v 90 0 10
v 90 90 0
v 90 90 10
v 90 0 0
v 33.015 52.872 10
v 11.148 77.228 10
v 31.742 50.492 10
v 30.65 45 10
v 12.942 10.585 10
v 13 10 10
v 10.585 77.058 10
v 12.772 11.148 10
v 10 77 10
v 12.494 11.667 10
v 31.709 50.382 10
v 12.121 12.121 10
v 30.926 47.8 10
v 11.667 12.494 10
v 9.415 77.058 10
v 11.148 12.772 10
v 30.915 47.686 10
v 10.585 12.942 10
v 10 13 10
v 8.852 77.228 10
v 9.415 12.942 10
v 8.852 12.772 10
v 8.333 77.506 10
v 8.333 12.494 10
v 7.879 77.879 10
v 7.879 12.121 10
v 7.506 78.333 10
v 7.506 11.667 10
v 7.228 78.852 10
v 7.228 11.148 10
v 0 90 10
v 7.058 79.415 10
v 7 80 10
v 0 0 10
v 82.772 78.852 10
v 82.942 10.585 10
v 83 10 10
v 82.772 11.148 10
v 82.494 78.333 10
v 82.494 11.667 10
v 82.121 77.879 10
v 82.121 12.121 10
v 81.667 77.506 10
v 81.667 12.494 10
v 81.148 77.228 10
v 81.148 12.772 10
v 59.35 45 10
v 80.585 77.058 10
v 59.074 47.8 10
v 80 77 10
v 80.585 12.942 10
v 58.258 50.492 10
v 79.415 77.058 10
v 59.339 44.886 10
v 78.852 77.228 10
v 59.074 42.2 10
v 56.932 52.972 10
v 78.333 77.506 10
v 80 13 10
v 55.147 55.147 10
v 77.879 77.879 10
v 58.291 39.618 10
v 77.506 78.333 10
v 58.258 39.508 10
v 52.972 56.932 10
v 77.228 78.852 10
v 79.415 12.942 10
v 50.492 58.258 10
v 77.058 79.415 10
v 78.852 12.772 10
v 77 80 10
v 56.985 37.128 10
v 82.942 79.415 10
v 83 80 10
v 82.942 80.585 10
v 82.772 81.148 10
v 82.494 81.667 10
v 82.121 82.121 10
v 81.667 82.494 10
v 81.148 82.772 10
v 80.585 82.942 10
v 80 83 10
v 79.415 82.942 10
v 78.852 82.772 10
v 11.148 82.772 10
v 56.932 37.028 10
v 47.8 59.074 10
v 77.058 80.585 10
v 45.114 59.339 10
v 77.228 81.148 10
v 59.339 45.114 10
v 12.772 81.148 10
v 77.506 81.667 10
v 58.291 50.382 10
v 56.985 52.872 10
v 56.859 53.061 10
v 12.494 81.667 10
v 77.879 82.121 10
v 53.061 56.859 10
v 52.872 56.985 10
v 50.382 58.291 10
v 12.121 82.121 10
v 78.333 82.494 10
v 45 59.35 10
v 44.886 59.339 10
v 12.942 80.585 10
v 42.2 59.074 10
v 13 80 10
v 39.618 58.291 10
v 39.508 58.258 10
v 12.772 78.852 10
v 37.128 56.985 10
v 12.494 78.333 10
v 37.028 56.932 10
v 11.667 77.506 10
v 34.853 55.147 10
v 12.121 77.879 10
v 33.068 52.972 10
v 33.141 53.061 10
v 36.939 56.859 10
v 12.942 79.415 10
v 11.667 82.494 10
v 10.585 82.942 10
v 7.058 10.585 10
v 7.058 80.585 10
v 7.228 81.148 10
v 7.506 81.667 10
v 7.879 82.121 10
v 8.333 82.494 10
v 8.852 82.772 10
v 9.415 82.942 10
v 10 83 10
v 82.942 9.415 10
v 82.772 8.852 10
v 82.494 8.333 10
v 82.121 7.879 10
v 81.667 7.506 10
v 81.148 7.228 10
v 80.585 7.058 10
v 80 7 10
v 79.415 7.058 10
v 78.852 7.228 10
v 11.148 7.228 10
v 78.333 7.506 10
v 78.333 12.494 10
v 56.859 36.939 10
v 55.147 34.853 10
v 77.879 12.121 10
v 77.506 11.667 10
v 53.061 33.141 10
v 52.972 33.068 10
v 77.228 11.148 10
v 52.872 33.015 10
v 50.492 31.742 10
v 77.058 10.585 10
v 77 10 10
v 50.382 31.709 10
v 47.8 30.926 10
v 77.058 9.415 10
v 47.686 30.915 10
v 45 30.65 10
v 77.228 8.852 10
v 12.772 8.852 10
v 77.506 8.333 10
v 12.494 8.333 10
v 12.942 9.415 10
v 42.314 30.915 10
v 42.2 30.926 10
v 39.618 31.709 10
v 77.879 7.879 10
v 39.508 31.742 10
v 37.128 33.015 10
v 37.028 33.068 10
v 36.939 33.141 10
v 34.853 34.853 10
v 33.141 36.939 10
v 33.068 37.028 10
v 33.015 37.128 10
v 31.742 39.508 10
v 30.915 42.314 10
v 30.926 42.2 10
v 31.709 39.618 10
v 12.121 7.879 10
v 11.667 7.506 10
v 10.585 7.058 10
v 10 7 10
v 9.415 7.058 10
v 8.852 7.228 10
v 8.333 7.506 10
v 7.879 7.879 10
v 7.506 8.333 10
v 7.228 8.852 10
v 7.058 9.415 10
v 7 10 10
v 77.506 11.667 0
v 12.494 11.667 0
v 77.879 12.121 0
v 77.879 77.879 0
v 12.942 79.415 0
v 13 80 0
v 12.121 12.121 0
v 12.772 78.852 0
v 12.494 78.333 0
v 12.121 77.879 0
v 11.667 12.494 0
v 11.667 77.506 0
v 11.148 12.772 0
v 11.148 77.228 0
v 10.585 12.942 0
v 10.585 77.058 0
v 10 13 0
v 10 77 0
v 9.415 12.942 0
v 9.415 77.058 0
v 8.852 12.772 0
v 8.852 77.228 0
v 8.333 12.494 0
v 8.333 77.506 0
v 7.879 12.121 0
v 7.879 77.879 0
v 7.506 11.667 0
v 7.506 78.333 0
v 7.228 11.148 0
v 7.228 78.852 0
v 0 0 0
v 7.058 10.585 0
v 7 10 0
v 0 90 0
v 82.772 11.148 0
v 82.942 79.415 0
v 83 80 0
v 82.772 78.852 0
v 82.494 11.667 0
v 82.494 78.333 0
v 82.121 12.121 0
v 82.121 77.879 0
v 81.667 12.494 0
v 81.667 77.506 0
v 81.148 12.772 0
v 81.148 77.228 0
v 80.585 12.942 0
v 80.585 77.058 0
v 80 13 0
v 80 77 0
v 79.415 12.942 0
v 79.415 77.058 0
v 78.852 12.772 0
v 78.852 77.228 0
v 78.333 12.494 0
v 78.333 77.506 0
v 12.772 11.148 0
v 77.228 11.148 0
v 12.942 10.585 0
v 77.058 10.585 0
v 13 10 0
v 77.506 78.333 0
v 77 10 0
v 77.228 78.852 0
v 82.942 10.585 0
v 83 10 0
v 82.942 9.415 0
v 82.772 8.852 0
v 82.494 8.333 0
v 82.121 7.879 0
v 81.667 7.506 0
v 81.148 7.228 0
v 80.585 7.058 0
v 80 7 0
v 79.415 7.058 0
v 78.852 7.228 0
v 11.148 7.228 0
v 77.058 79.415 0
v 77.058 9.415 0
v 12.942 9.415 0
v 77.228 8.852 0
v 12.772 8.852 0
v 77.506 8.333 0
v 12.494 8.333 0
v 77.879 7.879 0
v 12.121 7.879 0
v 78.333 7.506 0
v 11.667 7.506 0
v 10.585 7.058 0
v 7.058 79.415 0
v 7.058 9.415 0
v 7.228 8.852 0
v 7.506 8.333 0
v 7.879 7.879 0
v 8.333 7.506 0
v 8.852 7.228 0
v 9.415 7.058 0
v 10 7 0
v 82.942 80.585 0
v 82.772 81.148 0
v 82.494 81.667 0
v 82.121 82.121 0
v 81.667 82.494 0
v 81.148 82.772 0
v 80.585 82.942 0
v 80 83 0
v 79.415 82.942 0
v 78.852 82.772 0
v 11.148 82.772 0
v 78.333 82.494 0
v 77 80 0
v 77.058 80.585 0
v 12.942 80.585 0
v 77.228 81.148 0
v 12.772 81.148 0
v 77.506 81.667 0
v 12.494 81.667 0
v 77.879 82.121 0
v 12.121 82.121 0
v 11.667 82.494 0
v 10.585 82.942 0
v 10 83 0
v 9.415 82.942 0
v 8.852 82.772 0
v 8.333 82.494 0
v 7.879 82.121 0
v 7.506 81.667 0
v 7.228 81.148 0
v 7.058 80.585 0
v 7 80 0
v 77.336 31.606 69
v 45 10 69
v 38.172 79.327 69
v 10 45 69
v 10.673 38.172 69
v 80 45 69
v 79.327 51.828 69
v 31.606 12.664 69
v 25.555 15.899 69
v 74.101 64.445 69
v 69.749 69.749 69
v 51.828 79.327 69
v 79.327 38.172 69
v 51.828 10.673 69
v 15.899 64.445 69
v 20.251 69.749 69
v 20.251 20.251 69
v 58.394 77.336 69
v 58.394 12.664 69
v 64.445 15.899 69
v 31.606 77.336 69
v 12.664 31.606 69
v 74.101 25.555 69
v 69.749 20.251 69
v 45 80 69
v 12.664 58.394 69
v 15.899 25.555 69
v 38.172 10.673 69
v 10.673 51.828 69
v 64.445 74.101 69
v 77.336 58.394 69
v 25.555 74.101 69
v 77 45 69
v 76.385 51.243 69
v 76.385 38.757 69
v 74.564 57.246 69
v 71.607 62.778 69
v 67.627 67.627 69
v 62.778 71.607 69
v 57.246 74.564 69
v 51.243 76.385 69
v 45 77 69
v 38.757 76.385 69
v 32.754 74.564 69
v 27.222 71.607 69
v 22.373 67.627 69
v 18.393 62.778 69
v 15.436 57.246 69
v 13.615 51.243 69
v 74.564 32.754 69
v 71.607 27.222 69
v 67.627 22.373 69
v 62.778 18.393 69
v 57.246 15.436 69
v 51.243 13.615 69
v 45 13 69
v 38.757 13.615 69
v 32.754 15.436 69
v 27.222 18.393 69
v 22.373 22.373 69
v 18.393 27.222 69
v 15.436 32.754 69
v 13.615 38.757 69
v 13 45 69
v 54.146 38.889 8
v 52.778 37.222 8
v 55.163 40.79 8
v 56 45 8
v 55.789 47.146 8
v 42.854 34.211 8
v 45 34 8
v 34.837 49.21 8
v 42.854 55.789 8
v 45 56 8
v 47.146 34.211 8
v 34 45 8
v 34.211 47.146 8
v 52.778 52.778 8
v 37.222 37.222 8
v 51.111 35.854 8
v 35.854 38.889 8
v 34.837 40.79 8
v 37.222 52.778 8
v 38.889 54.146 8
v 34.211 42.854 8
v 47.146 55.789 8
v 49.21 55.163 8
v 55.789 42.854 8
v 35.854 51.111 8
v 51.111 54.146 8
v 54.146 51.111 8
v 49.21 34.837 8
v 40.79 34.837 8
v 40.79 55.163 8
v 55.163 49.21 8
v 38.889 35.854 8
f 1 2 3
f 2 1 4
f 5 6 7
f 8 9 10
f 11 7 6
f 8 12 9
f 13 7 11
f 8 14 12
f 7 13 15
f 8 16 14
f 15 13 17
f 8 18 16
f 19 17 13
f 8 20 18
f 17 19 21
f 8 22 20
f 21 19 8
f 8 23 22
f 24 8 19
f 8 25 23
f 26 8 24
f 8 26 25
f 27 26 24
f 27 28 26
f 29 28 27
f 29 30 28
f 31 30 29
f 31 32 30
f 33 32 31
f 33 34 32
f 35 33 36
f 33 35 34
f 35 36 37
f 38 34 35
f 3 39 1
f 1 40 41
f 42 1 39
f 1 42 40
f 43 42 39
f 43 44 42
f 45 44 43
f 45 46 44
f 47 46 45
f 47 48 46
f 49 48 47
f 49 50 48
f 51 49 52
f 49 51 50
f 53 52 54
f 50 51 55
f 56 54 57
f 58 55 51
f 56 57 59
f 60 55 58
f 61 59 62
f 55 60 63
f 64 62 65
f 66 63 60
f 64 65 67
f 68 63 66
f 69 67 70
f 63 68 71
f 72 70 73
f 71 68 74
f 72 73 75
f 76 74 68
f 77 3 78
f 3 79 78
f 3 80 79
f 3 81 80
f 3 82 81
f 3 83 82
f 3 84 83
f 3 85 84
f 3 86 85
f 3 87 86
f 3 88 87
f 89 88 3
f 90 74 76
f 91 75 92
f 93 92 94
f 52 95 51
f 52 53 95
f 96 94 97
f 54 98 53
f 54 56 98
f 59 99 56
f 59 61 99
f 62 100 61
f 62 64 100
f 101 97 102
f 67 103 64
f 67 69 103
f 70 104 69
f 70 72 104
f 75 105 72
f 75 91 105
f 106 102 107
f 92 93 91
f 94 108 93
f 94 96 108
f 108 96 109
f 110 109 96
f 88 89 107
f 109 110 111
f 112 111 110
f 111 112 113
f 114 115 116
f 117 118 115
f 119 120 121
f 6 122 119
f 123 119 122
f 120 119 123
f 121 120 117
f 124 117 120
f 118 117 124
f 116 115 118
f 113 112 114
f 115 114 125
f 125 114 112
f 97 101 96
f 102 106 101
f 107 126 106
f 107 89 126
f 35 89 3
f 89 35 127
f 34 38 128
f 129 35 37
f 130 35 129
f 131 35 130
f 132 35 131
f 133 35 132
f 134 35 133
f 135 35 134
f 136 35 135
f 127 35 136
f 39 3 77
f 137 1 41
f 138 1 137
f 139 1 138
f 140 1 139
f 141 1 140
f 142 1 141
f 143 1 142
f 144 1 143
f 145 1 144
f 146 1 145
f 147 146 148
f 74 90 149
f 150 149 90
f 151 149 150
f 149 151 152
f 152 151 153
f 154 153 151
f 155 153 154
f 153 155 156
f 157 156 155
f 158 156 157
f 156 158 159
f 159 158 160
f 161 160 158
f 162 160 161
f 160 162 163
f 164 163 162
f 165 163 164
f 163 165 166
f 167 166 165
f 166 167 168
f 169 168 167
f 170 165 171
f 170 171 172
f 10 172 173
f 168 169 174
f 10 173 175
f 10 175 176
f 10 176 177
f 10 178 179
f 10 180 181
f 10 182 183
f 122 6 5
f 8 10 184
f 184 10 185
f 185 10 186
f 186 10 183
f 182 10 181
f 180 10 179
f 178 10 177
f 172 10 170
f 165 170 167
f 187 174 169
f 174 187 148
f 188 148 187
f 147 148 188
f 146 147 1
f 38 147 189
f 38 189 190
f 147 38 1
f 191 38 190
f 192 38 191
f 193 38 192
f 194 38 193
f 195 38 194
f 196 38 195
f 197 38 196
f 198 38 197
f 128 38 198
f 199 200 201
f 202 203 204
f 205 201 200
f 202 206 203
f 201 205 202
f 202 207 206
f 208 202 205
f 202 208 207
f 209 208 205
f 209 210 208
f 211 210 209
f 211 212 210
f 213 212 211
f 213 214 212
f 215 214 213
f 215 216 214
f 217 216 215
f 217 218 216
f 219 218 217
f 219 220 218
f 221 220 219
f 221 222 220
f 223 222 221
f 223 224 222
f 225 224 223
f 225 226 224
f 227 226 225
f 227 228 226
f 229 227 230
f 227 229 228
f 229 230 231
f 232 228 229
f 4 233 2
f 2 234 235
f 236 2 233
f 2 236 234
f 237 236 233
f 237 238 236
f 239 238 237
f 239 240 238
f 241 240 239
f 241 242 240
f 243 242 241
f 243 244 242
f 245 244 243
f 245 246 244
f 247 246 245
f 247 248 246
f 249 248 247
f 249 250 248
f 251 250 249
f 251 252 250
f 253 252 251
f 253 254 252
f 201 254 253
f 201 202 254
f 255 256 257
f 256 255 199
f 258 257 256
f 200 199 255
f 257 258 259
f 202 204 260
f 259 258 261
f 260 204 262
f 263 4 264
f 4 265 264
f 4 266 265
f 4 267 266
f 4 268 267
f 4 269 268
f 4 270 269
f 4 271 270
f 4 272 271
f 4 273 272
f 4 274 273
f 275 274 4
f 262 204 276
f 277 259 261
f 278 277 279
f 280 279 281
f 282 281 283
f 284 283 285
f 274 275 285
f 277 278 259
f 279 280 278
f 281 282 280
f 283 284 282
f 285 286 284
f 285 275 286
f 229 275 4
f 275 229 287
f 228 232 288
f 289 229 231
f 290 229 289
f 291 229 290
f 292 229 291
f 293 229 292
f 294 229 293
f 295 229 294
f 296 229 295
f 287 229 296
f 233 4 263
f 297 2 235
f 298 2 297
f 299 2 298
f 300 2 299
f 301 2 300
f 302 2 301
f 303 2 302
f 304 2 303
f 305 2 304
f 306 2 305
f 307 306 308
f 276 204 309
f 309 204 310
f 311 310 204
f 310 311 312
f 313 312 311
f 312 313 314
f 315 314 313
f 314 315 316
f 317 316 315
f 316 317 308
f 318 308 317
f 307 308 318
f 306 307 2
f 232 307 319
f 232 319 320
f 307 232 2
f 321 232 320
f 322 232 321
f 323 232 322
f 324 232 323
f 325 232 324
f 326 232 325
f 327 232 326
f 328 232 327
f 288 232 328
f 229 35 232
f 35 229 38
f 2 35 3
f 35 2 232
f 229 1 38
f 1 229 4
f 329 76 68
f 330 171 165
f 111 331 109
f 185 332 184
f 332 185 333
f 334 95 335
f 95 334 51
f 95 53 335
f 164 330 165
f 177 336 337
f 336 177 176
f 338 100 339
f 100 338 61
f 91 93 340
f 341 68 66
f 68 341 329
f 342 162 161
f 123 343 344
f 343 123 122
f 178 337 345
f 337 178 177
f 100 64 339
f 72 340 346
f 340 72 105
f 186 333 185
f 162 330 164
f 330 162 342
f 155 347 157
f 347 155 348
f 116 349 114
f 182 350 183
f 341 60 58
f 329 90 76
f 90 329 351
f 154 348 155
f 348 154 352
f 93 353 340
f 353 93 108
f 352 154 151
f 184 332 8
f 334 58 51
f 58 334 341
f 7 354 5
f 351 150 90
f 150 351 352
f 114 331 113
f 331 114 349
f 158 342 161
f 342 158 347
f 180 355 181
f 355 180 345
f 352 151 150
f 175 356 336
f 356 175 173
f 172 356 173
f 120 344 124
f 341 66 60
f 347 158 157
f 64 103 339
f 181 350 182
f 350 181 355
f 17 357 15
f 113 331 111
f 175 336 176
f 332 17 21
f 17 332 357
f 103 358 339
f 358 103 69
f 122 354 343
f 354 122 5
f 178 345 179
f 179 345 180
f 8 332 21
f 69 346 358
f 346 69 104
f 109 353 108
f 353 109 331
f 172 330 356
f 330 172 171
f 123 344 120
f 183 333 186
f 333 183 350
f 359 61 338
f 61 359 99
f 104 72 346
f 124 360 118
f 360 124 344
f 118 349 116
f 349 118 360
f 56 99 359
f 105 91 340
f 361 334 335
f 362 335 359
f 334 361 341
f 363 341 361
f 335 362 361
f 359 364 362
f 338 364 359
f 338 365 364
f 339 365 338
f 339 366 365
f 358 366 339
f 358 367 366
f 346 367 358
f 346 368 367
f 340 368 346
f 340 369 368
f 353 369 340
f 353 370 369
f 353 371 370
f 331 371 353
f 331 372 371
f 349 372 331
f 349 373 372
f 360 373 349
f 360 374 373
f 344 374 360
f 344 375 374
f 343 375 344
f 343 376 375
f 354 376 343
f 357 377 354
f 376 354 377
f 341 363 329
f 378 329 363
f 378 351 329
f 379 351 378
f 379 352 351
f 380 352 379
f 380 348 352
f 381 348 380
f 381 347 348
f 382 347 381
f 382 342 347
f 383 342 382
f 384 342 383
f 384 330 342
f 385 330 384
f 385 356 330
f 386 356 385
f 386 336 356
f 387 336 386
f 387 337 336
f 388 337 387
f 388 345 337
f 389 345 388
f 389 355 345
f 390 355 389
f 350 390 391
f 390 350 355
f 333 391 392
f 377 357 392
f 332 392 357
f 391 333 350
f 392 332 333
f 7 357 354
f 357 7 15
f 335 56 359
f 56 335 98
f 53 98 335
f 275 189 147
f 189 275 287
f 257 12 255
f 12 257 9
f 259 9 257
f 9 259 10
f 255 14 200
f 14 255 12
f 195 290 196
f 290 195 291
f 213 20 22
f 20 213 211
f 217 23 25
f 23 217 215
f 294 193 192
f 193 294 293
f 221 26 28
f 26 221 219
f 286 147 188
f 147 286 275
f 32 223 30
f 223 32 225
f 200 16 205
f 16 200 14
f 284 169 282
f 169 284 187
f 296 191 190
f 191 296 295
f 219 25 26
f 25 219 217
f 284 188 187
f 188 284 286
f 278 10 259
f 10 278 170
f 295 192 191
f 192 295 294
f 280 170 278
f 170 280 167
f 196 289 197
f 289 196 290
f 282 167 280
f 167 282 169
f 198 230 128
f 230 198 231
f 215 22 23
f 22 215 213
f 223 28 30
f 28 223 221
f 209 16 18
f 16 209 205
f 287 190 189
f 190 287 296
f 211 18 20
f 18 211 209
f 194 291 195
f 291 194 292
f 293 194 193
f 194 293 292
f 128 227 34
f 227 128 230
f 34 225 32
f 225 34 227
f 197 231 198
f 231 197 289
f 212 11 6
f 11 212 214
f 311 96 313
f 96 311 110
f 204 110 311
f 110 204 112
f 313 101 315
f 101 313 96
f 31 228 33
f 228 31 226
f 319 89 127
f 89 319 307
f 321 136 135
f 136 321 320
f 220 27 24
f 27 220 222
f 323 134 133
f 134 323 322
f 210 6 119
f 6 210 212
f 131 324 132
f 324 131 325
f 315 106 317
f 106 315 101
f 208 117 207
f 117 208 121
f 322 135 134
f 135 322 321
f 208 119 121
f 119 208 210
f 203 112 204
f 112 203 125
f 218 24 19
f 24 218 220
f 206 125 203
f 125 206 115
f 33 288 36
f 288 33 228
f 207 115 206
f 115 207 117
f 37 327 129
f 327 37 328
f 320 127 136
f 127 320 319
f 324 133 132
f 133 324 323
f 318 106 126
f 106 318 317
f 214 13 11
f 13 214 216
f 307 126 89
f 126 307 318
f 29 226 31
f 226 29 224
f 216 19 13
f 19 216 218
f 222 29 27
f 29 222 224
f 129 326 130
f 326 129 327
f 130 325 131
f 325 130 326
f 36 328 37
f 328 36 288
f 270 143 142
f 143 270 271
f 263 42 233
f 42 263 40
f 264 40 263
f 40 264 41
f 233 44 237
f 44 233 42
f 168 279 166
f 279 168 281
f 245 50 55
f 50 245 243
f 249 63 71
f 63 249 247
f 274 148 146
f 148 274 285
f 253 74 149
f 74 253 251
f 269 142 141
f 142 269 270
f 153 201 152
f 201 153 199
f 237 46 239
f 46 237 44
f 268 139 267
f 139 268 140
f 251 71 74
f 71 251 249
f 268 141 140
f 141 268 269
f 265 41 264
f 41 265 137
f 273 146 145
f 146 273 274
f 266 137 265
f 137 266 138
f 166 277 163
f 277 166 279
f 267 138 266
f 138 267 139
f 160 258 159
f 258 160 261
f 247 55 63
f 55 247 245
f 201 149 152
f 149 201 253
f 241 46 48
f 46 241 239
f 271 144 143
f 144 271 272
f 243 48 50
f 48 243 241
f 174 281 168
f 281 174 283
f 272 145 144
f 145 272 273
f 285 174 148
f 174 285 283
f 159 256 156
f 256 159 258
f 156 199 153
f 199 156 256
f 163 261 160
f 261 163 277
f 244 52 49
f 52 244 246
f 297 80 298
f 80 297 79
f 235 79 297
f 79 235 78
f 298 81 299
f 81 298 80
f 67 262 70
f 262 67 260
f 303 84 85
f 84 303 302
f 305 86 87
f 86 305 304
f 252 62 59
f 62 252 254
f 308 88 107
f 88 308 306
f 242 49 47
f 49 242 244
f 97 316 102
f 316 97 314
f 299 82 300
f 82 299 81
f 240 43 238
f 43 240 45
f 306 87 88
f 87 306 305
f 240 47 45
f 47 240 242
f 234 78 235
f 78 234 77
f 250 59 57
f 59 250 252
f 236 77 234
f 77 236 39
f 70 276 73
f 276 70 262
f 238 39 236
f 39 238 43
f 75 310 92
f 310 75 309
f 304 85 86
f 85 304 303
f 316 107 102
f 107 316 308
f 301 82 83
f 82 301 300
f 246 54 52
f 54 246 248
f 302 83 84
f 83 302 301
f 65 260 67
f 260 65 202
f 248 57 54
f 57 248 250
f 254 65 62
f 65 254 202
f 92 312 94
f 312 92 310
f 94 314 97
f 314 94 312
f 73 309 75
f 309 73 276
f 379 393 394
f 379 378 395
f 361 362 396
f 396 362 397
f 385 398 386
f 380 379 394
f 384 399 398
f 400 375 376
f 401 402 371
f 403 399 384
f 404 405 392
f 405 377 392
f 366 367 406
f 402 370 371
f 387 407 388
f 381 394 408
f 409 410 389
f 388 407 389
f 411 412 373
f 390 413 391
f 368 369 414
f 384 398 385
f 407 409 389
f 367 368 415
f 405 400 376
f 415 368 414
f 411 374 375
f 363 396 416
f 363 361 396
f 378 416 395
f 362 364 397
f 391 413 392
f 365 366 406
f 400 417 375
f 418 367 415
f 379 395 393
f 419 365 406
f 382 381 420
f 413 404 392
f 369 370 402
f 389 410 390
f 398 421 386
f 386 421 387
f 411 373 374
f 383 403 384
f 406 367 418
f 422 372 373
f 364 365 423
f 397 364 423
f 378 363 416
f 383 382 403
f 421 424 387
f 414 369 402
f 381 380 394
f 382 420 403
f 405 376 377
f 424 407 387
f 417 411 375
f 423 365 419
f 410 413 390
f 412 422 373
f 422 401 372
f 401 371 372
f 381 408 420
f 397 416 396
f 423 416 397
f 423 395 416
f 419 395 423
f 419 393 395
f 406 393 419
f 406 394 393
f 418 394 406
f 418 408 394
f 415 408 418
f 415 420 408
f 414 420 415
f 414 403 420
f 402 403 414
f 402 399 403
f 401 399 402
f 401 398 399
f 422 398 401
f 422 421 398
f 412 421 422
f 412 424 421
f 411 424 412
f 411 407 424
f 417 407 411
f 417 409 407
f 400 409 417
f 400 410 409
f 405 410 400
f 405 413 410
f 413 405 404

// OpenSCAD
$fn = 32;

// ----------------------------------------------------------------------
// Hopper: flanged with square flange
// ----------------------------------------------------------------------

// --- parameters (mm) ---
fl = 90;                  // flange side, X and Y
fl_t = 10;                // flange thickness
cone_h = 60;              // cone height above the flange
top_d = 70;               // cone mouth diameter
bot_d = 28;               // cone spout diameter
wall = 3;                 // cone wall thickness
hole_r = 3;               // flange hole radius
hole_in = 10;             // hole inset from the corners
fit_tol = 0.02;           // tolerance for press fits, mm
free_tol = 0.2;           // tolerance for clearance fits, mm

bore_d = bot_d - 2 * wall;  // spout bore diameter
total_h = fl_t + cone_h - 1;  // overall height

difference() {
  union() {
    cube([fl, fl, fl_t]);
    translate([fl / 2, fl / 2, fl_t - 1])
      cylinder(h = cone_h, d1 = bot_d, d2 = top_d);
  }
  translate([fl / 2, fl / 2, fl_t - 2])
    cylinder(h = cone_h + 1, d1 = bore_d, d2 = top_d - 2 * wall);
  for (sx = [0, 1], sy = [0, 1])
    translate([sx ? fl - hole_in : hole_in,
               sy ? fl - hole_in : hole_in, -1])
      cylinder(r = hole_r, h = fl_t + 2);
}
